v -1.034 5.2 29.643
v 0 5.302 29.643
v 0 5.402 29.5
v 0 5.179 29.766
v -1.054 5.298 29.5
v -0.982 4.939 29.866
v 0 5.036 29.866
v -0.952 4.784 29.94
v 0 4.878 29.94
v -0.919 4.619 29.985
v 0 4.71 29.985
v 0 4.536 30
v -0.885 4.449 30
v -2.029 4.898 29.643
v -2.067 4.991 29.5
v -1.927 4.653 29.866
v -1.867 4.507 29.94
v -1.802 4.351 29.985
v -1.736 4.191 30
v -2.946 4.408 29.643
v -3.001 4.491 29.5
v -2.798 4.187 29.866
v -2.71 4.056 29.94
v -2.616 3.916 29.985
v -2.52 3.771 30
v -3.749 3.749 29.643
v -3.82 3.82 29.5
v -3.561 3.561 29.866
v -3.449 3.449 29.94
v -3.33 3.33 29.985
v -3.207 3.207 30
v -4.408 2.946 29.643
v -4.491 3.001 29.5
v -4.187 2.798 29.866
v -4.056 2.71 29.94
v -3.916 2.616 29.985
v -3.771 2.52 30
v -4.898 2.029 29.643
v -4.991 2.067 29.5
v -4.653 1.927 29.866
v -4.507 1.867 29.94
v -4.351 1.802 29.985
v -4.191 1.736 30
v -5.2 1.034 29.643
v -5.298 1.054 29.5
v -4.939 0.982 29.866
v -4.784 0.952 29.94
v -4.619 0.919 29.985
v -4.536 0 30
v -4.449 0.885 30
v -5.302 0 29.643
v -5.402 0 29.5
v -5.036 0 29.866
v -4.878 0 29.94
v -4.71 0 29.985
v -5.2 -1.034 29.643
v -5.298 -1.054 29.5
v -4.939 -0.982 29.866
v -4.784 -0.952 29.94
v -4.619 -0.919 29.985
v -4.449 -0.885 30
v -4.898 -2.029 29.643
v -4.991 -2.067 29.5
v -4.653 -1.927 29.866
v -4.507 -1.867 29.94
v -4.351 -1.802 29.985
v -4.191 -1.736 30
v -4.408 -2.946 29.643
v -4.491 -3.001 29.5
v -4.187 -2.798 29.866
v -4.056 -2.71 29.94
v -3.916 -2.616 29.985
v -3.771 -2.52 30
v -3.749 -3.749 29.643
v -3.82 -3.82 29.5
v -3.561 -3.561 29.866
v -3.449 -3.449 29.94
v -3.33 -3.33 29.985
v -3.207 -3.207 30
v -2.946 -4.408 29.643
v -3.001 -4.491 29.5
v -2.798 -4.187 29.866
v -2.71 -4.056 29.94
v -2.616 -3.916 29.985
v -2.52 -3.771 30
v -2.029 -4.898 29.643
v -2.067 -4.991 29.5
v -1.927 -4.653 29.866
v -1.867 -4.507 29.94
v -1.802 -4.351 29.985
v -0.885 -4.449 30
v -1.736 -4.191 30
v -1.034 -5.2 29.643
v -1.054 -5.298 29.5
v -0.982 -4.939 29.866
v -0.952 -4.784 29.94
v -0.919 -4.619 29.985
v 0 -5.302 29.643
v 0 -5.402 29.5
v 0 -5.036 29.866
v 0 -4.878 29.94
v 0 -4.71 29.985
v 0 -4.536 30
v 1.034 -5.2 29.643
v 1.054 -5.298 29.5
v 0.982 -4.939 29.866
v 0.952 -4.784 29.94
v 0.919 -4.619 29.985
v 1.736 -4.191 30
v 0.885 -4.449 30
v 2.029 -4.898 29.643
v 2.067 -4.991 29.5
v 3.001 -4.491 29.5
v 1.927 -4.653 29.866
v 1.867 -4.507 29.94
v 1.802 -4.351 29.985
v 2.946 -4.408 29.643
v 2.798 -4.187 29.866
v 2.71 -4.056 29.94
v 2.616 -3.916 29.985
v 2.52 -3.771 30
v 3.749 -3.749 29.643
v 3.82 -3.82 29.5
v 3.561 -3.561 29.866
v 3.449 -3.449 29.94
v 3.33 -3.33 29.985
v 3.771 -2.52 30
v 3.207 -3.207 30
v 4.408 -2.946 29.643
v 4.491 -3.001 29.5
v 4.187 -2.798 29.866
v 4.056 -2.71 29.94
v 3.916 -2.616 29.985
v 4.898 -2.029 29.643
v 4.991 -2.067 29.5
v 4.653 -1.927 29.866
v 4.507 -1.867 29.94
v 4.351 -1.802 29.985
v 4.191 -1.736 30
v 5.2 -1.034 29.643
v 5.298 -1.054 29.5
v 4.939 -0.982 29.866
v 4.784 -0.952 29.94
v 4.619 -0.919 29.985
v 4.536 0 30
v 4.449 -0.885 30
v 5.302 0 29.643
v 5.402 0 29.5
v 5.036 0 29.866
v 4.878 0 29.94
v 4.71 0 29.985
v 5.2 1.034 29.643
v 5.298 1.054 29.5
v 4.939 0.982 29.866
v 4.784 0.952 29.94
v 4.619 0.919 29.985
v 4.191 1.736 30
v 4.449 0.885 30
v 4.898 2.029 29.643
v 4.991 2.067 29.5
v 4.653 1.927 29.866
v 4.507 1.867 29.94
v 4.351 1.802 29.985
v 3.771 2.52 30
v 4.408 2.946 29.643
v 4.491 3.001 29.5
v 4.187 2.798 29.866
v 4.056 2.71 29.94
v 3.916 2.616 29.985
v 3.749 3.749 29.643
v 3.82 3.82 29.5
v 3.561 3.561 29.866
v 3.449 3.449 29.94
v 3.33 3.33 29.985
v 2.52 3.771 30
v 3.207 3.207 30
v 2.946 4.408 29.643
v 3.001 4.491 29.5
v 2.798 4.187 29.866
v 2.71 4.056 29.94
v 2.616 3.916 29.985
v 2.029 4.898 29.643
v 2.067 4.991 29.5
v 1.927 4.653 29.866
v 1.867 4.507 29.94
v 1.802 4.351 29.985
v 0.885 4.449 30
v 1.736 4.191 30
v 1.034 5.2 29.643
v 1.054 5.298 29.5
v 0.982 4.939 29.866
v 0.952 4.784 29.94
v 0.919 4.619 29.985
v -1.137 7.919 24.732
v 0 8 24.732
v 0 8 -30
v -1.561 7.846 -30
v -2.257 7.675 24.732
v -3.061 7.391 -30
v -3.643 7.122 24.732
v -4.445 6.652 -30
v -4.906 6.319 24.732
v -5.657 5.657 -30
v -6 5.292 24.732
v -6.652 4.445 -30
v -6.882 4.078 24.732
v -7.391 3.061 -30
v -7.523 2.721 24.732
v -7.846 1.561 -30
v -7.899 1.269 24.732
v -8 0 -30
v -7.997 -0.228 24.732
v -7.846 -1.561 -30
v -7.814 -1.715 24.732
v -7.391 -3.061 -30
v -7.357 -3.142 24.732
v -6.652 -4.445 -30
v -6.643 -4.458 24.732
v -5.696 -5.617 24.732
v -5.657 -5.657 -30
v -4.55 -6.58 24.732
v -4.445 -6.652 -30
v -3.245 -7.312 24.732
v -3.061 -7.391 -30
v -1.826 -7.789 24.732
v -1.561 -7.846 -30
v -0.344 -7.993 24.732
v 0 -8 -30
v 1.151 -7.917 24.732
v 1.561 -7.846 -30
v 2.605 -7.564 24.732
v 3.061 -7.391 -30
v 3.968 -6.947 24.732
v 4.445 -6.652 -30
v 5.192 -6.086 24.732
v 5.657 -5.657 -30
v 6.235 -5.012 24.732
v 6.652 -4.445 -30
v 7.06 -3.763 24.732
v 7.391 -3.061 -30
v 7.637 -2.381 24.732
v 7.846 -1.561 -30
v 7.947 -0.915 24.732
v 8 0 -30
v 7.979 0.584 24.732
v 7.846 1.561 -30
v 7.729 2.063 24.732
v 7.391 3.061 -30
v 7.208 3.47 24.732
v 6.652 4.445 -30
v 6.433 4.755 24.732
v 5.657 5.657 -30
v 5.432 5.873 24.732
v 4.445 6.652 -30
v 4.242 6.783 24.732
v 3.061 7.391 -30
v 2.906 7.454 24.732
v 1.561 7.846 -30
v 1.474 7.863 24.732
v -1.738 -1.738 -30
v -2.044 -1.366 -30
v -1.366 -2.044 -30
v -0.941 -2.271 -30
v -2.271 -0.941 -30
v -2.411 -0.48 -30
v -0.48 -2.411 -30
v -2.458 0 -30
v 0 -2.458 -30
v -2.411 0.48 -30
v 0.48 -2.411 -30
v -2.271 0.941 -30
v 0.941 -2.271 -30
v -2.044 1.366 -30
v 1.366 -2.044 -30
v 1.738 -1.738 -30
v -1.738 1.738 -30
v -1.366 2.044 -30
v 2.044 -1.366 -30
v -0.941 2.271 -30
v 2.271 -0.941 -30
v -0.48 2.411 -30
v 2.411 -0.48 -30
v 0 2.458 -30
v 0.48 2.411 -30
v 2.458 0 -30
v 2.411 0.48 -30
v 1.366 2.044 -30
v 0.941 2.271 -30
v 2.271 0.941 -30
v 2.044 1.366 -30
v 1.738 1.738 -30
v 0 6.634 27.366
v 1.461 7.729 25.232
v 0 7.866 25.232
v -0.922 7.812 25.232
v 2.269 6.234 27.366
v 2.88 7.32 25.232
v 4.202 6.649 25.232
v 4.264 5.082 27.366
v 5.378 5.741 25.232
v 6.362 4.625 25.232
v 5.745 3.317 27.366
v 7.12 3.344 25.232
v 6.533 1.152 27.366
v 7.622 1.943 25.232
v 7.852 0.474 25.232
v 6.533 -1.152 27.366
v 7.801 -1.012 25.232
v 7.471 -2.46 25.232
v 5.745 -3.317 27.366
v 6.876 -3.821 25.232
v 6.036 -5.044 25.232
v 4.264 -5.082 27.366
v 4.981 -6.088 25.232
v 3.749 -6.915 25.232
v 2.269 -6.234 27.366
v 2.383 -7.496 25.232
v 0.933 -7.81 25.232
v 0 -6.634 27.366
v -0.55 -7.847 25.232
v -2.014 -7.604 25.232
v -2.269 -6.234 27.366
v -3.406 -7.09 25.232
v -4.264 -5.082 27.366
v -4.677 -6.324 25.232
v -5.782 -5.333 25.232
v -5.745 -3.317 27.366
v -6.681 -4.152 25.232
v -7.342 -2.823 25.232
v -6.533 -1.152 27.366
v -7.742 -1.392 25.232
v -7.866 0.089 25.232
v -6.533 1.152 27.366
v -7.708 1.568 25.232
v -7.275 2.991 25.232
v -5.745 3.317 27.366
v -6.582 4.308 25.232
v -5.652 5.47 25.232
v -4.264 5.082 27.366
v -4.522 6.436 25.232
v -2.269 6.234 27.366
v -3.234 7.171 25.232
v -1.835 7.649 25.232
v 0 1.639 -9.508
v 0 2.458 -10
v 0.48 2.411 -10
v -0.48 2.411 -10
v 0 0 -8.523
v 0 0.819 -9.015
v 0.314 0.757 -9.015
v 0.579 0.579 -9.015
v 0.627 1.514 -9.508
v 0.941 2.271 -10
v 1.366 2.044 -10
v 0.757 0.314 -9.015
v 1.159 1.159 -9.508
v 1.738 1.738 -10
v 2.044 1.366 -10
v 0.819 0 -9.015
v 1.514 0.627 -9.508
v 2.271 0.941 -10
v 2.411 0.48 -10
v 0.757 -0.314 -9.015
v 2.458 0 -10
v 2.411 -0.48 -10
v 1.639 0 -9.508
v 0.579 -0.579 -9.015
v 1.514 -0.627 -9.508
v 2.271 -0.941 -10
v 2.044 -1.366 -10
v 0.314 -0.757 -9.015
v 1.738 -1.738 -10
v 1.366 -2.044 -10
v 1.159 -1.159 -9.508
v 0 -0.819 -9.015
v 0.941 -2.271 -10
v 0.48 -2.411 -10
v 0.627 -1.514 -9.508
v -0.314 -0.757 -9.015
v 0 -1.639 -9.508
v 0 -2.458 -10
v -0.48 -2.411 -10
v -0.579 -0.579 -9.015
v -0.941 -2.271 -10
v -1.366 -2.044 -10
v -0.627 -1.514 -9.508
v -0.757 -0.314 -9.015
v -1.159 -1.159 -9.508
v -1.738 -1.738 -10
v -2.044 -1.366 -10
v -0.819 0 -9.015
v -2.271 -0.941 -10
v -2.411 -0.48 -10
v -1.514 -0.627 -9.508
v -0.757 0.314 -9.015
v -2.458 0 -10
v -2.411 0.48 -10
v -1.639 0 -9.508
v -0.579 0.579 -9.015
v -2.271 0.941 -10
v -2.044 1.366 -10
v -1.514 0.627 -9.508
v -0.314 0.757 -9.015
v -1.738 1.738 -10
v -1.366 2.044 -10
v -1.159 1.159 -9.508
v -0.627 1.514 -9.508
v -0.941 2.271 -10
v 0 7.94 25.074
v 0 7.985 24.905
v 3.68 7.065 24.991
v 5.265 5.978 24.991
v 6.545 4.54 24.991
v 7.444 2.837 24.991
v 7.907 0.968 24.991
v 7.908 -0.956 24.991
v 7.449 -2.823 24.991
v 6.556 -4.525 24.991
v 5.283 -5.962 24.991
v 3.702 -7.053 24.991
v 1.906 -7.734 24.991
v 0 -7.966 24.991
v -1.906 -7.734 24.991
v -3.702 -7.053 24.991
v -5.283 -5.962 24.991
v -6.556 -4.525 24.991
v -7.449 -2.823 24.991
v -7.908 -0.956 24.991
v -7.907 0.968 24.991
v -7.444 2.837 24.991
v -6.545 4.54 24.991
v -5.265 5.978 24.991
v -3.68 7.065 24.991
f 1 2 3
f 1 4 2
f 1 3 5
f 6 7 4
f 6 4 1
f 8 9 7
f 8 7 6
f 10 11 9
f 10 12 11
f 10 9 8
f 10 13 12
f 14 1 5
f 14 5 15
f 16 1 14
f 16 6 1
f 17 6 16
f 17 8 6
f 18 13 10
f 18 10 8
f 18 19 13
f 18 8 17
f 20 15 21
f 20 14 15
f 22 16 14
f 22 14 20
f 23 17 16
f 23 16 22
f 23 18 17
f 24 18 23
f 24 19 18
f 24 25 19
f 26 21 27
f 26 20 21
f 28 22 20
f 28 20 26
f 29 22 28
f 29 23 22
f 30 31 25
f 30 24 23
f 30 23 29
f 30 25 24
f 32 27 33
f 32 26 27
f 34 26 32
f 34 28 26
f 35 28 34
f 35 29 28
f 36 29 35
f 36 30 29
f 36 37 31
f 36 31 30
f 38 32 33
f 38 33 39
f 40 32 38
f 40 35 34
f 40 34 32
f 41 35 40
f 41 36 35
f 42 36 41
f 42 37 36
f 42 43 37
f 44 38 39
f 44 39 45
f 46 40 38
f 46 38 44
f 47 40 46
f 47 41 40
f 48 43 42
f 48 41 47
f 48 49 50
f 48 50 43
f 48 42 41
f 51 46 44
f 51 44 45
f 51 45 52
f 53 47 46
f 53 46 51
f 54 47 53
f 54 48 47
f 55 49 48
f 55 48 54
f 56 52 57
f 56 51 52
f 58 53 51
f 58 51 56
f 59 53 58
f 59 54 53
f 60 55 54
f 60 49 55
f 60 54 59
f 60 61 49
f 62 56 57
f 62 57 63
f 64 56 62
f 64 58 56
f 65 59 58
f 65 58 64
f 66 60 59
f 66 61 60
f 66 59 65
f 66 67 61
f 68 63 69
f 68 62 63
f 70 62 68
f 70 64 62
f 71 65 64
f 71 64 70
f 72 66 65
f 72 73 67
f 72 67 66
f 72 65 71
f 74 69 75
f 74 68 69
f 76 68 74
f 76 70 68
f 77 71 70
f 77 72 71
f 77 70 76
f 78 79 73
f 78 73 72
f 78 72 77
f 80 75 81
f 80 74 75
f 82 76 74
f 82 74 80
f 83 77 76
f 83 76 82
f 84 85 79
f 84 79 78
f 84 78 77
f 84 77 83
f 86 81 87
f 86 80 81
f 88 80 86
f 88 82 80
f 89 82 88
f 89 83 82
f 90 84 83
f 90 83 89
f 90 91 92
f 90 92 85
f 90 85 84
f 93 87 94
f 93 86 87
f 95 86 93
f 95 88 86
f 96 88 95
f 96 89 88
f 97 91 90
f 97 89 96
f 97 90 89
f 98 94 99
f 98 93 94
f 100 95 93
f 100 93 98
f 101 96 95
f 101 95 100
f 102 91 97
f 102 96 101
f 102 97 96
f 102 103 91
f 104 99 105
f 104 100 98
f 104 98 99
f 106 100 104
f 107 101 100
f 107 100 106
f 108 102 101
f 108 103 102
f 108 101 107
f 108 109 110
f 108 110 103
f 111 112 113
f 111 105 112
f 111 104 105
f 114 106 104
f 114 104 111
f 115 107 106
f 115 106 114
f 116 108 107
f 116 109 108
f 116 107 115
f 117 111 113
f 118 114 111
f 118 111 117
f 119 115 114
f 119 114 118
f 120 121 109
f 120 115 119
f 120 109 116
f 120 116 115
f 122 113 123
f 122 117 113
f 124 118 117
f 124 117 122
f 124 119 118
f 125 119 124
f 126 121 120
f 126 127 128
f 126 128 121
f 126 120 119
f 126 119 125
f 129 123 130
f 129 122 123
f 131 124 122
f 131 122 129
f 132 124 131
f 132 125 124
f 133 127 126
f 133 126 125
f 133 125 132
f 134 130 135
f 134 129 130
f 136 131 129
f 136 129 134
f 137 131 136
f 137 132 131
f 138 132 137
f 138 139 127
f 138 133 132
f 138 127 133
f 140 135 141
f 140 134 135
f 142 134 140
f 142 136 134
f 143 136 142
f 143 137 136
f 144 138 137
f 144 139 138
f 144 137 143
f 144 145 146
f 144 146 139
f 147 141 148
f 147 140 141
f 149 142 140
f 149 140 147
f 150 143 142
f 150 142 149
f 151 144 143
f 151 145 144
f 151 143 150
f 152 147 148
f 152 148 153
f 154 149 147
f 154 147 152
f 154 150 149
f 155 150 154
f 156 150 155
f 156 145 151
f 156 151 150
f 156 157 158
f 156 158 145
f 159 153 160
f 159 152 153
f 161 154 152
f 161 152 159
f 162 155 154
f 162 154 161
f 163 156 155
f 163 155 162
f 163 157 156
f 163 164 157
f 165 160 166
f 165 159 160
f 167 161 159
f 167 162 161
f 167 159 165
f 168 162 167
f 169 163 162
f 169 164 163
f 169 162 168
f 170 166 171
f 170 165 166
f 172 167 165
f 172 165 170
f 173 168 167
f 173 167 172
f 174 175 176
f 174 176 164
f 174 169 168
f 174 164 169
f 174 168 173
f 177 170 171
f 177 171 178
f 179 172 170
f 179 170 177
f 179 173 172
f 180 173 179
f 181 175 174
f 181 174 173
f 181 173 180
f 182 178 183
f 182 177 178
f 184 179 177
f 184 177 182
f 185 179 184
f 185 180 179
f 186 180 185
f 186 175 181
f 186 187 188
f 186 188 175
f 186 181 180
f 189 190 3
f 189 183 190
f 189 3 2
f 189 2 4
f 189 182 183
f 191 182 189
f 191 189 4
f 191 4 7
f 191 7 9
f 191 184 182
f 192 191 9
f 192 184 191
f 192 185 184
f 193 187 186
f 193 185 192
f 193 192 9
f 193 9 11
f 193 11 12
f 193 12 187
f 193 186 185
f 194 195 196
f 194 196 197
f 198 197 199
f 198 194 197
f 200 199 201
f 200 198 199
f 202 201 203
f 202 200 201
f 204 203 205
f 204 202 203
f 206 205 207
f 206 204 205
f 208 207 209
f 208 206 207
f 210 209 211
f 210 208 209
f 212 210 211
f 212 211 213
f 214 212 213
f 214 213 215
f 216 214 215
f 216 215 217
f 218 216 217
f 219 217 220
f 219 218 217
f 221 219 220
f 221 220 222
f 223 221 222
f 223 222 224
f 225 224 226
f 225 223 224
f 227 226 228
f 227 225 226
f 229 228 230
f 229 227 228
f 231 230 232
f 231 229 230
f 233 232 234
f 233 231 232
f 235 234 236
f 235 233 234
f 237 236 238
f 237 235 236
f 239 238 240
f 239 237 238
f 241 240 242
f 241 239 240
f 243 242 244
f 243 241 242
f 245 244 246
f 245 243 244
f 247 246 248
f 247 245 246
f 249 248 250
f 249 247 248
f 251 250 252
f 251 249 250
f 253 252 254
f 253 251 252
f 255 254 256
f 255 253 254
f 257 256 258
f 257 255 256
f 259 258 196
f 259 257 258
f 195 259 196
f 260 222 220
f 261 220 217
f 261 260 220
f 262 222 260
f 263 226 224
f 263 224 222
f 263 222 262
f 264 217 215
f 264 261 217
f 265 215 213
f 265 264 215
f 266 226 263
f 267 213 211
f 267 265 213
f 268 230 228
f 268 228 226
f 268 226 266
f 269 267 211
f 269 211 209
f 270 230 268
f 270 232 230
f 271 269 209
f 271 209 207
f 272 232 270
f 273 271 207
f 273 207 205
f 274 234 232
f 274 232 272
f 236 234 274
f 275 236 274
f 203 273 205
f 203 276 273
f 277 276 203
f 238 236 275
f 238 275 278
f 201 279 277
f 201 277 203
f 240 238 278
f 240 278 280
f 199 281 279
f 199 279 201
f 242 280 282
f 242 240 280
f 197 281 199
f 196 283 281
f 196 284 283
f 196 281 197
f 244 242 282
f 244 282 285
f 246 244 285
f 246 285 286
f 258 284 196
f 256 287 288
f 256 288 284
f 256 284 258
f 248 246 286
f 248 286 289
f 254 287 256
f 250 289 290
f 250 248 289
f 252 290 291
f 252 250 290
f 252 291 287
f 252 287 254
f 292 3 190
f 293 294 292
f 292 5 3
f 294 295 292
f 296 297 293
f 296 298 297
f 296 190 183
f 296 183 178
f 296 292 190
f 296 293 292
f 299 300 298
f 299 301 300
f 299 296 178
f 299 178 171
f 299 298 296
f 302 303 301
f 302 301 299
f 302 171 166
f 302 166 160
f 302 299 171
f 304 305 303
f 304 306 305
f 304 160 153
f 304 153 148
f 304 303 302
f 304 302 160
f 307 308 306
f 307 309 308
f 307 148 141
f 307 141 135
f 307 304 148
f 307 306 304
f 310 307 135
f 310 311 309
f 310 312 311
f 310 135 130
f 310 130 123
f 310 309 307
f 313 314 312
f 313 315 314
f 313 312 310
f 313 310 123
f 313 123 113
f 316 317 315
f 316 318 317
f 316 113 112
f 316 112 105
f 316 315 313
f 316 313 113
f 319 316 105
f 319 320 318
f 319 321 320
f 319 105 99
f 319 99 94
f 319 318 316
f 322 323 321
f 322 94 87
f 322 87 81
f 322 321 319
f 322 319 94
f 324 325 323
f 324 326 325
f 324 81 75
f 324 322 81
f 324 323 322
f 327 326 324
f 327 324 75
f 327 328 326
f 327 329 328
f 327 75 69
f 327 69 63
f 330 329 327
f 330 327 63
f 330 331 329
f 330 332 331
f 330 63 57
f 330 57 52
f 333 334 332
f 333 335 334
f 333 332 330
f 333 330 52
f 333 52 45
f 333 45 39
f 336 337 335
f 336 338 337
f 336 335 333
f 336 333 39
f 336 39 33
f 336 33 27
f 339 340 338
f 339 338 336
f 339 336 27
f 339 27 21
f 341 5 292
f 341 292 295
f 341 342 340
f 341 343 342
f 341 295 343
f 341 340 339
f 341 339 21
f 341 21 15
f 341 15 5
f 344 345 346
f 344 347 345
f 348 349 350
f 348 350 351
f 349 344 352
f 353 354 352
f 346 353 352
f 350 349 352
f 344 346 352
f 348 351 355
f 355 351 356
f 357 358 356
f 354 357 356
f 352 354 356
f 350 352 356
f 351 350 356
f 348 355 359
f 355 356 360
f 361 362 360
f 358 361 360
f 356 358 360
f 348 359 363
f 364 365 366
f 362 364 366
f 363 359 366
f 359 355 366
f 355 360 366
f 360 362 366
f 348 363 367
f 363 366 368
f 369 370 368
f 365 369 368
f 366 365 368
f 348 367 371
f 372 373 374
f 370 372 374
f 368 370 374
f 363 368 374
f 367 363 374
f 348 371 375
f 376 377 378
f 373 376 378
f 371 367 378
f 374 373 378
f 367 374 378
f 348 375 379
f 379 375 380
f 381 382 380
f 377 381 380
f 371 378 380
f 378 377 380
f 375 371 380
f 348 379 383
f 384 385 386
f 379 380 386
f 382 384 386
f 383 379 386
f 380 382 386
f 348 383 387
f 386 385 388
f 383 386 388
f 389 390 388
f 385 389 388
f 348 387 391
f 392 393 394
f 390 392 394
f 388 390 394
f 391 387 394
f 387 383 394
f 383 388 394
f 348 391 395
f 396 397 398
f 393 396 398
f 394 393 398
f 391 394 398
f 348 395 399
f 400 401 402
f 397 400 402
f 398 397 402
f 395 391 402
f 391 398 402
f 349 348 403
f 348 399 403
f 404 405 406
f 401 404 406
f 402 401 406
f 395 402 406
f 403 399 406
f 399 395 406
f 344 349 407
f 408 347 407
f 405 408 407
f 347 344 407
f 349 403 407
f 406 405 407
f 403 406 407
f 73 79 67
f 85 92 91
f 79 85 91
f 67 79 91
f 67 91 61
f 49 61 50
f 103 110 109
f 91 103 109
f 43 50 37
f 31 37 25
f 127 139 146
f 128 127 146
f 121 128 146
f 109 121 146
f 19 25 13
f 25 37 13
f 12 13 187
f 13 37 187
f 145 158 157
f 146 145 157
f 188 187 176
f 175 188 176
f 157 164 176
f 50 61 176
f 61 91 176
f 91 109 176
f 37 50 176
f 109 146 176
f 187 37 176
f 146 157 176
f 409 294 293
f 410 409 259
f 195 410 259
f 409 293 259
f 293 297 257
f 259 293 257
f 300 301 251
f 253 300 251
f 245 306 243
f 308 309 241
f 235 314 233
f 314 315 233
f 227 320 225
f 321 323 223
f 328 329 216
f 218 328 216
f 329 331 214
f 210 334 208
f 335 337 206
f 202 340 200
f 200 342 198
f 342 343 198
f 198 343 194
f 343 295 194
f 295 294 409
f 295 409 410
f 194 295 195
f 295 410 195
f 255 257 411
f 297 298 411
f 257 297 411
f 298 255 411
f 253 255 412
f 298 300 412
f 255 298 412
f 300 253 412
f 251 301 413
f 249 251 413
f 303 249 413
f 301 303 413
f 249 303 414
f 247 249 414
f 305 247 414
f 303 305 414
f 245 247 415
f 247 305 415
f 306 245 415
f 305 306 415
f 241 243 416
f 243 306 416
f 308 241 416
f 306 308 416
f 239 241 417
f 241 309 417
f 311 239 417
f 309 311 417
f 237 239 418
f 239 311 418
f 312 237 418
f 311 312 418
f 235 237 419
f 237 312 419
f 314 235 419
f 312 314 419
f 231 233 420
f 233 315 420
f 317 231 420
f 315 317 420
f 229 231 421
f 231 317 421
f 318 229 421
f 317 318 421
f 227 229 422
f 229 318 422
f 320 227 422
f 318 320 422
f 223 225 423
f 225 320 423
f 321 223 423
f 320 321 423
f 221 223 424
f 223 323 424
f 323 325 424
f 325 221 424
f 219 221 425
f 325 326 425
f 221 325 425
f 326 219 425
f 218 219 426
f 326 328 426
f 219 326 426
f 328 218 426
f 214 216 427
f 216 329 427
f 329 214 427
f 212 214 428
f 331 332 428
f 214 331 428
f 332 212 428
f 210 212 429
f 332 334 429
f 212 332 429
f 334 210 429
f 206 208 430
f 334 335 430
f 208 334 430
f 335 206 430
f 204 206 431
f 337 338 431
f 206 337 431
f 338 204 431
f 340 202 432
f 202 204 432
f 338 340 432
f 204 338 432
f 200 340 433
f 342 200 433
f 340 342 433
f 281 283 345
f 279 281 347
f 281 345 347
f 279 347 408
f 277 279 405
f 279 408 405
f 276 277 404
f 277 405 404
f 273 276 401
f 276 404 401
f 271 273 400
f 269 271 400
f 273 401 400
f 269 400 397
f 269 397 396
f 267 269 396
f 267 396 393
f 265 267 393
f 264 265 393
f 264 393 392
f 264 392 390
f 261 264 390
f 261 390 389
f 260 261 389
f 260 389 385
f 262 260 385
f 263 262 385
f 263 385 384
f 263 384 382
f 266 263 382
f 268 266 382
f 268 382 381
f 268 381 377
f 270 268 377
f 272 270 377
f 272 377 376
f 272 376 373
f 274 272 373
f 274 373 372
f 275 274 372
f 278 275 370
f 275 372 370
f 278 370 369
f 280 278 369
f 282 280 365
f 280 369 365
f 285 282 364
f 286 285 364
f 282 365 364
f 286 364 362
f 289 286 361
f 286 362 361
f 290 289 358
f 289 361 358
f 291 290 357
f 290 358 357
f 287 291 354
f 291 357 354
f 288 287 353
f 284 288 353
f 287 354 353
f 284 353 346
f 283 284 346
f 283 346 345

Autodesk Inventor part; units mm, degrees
ref_plane "YZ Plane" through (0, 0, 0) normal (1, 0, 0) x (0, 1, 0)
ref_plane "XZ Plane" through (0, 0, 0) normal (0, 1, 0) x (-1, 0, 0)
ref_plane "XY Plane" through (0, 0, 0) normal (0, 0, 1) x (1, 0, 0)
sketch "Esboço1" plane through (0, 0, 0) normal (1, 0, 0) x (0, 1, 0)
  line L0 (-1.6, 0) -> (9.6, 0) construction
  line L1 (0, -42) -> (0, 42) construction
  line L2 (8, 30) -> (0, 30)
  line L3 (0, 30) -> (0, -30)
  line L4 (0, -30) -> (8, -30)
  line L5 (8, -30) -> (8, 30)
  line L6 (5.1132, 30) -> (8, 25)
  point P0 (0, 0)
  dimension "d0" = 16
  dimension "d1" = 60
  dimension "d2" = 5
  dimension "d3" = 30
revolve "Revolução1" add sketch "Esboço1" angle 360 about axis through (0, 0, 30) along (0, 0, -1) contours L6 L5 L4 L3 L2
fillet "Arredondamento1" radius 1 2 edges at (0, -5.1132, 30) (0, -8, 25)
sketch "Esboço2" plane through (0, 0, -30) normal (0, 0, -1) x (-1, 0, 0)
  circle A0 centre (0, 0) radius 8 projected
hole "Furo1" at (0, 0, -30) direction (0, 0, 1) diameter 4.917 depth 20 tip angle 118 thread size "M6x1" class "6H" standard "ISO Metric profile"
properties material "Aço SAE 1045"
